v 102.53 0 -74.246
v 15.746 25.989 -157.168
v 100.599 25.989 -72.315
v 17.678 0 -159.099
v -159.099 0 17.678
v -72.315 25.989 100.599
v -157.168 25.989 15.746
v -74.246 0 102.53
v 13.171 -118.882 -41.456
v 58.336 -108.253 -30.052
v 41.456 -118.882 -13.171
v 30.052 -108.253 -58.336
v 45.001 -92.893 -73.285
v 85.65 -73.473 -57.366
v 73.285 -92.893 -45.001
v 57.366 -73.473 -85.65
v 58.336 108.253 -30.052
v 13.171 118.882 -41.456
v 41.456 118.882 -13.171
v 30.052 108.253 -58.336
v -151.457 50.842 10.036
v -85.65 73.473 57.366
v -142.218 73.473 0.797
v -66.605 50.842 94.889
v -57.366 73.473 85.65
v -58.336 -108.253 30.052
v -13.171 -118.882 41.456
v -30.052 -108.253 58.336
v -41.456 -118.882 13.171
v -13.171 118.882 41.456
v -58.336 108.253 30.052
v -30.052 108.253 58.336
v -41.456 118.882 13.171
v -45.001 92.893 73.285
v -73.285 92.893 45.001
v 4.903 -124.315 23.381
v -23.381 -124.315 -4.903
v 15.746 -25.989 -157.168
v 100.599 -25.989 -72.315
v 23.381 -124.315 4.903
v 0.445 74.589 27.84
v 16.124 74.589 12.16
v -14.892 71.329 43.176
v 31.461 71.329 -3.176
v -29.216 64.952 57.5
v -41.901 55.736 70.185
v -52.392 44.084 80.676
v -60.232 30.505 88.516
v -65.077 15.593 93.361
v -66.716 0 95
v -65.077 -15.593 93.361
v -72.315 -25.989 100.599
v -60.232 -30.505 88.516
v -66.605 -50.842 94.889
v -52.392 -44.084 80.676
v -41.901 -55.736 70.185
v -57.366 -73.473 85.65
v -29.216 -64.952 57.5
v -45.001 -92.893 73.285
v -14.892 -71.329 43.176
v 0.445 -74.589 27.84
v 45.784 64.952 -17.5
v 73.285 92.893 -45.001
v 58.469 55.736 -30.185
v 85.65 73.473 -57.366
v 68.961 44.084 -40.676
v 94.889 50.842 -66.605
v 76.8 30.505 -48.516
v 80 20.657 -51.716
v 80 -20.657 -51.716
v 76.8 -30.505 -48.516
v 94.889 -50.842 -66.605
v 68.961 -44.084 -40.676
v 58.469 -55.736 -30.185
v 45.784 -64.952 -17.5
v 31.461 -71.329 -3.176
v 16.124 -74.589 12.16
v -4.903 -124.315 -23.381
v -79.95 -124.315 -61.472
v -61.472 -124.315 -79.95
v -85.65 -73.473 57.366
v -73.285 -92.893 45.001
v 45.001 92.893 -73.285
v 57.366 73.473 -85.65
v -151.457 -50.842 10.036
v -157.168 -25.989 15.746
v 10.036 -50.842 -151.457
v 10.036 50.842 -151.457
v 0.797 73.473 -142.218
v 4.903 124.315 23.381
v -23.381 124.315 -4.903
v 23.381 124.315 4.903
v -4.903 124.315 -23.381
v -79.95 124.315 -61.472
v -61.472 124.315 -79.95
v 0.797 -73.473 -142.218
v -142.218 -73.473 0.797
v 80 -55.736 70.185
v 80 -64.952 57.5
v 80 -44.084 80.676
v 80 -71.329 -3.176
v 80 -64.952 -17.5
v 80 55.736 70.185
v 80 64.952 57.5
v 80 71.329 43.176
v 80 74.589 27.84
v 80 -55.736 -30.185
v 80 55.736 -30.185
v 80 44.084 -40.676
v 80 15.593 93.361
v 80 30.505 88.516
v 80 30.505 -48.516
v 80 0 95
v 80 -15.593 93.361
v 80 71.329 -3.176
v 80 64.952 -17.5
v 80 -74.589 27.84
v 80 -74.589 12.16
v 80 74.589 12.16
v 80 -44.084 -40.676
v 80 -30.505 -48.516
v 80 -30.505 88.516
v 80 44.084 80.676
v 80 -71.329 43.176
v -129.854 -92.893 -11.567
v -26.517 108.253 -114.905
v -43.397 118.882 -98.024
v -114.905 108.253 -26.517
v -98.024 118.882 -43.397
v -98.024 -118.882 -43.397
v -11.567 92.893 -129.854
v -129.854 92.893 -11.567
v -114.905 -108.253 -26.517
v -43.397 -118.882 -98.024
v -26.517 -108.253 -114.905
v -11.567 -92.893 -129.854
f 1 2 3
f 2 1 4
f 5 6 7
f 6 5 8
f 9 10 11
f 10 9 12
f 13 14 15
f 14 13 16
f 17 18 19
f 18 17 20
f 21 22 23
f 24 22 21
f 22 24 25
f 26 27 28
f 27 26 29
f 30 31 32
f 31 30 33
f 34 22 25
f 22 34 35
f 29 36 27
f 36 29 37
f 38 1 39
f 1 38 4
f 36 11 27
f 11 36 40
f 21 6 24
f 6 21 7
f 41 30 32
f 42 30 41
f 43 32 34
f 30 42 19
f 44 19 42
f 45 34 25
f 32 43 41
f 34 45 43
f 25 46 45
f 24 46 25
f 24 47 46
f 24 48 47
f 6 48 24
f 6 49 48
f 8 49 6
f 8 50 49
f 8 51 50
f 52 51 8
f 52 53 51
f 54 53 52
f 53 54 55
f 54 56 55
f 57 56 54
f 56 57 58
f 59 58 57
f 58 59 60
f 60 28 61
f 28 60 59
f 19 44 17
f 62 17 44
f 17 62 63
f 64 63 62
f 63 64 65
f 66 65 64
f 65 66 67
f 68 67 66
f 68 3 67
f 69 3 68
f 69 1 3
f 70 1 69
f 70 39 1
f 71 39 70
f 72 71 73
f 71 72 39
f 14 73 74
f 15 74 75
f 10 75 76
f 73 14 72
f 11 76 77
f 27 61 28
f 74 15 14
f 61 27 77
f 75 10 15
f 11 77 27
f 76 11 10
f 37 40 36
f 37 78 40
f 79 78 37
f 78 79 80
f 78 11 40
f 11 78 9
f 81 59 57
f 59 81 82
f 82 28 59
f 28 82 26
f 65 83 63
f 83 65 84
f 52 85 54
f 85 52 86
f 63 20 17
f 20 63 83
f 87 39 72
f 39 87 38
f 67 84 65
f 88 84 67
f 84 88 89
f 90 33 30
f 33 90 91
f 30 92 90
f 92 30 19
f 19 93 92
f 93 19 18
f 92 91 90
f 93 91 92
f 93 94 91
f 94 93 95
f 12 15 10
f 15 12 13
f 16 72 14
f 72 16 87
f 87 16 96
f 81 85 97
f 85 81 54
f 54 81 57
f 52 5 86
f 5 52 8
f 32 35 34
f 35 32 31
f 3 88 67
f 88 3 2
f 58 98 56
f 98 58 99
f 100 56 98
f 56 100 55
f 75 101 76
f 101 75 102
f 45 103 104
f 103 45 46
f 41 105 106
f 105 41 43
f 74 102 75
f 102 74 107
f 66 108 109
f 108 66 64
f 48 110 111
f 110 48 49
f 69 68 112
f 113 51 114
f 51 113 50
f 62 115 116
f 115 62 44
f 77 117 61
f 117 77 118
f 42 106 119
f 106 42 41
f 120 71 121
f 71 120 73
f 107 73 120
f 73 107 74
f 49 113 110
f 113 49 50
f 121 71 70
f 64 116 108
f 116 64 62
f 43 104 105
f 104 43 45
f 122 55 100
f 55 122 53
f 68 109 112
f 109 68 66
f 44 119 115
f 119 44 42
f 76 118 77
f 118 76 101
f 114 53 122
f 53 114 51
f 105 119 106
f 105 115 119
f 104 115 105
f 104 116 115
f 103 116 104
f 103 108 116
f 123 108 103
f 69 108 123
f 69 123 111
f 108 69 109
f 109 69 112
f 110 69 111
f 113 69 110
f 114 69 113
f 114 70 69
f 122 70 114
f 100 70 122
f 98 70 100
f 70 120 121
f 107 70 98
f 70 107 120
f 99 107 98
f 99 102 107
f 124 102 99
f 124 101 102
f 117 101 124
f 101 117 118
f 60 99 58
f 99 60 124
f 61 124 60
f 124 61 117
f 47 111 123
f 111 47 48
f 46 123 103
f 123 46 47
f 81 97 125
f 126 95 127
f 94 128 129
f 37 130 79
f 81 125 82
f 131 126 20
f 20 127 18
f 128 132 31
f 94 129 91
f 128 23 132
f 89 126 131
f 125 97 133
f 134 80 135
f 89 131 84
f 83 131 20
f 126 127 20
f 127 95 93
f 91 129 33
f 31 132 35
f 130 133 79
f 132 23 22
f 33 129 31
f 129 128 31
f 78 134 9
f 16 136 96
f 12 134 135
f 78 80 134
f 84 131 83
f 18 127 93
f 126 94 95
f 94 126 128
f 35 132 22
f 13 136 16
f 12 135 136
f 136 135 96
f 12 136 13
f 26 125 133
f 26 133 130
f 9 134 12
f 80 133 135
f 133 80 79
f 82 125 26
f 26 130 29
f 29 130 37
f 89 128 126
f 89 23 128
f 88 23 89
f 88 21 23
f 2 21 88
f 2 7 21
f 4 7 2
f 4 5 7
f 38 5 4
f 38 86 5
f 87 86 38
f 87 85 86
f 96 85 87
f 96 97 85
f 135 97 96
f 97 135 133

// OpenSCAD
module base() {
	
	rotate([0, 45, 0]) {
		translate([0, 0, -20]) {
			cylinder(r = 125, h=40);
		}
	}
	
	rotate([0, 90, 0]) {
		translate([-20, 0, -70]) {
			cylinder(r = 75, h = 150);
		}
	}

	rotate([0, 45, 0]) {
		translate([0, 0, -100]) {
			cylinder(r = 125, h = 80);
		}
	}
	
}

base();
